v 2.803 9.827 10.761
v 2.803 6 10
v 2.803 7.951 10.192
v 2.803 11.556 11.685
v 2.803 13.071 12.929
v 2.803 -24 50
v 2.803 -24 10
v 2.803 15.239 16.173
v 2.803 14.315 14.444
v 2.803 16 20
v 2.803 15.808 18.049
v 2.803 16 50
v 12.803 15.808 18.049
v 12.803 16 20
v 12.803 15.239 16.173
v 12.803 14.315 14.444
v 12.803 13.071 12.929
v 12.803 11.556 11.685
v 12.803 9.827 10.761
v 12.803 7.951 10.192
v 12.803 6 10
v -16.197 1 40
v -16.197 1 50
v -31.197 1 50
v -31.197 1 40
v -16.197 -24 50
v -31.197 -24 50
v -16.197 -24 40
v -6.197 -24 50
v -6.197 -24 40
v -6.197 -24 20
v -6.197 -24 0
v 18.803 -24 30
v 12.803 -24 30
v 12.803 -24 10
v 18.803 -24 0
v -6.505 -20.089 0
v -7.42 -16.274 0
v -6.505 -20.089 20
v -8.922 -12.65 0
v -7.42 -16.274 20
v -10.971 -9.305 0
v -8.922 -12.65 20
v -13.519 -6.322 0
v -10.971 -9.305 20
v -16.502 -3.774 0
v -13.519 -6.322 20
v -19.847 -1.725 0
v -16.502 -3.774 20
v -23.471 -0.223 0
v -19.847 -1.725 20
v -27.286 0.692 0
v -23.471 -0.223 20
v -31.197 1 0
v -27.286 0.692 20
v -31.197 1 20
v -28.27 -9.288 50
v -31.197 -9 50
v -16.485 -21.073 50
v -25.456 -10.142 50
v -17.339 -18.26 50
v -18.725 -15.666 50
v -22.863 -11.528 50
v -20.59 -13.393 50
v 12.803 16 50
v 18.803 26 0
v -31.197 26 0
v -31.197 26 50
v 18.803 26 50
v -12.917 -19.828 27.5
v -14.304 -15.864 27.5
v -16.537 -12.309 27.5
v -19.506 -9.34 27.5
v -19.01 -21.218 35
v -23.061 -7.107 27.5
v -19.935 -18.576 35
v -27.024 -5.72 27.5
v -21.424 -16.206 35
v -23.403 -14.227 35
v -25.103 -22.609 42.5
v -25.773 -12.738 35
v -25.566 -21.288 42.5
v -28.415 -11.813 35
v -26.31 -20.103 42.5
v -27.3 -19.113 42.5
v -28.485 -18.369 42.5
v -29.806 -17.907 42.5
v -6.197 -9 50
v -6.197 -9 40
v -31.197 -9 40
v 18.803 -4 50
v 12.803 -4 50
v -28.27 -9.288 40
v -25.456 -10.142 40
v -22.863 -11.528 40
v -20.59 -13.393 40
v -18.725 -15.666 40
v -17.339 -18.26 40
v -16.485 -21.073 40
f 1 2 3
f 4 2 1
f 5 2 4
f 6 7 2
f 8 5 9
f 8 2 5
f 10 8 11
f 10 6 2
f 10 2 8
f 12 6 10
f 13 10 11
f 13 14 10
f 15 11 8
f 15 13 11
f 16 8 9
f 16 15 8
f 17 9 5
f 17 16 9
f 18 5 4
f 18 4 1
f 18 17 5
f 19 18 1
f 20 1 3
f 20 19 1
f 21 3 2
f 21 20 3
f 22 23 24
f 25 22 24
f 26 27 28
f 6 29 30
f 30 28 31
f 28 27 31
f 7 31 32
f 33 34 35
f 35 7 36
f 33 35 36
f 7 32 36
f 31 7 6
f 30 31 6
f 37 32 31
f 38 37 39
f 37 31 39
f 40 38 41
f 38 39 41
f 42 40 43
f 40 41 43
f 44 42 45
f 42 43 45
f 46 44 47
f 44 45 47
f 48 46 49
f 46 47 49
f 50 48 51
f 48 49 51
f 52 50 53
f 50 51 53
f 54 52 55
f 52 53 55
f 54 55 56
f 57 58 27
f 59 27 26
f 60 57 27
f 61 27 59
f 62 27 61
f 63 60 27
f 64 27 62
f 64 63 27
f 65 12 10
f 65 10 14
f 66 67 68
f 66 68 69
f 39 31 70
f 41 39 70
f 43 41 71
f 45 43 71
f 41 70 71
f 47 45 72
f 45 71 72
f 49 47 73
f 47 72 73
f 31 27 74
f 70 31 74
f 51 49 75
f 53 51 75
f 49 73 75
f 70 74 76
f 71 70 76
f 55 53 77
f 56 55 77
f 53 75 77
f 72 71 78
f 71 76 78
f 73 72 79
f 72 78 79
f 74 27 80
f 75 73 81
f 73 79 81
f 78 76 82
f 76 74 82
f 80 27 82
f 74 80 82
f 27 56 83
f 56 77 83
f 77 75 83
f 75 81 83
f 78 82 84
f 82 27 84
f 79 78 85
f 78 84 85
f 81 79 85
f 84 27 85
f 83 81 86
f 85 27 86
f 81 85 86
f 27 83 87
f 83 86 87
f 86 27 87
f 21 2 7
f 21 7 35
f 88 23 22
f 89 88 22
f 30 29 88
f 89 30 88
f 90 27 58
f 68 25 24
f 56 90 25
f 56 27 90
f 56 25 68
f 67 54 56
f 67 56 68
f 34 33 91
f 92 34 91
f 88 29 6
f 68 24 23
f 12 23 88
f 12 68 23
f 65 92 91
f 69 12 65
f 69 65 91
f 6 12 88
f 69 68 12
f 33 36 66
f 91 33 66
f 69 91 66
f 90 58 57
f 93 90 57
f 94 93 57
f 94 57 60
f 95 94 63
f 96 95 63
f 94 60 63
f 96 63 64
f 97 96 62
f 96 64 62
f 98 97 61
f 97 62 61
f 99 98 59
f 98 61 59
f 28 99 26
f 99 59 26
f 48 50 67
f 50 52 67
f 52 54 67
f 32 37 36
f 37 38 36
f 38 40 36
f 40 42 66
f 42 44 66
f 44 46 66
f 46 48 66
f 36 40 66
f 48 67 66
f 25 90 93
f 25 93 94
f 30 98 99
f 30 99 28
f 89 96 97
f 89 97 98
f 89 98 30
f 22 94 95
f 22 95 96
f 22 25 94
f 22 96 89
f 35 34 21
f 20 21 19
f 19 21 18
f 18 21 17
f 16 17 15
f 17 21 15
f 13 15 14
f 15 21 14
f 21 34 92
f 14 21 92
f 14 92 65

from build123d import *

# Parameters (mm, degrees)
F0_W      = 50
F0_H      = 50
F1_DEPTH  = 50
F4_DEPTH  = 10
F5_SIZE   = 10
F6_W      = 10
F6_H      = 40
F8_DEPTH  = 40
F9_R      = 10
F11_DEPTH = 6


with BuildPart() as f1:
    # F0 (on Top) → F1 (new body)
    with BuildSketch(Plane.XY):
        with Locations((-6.196748, 1.000199)):
            Rectangle(F0_W, F0_H)
    extrude(amount=F1_DEPTH)

    # F3 (on face) → F4 (cut)
    with BuildSketch(Plane.XY.offset(50)):
        with BuildLine():
            ThreePointArc((-31.196748, -8.999801), (-20.590146, -13.393199), (-16.196748, -23.999801))
            Line((-16.196748, -23.999801), (-6.196748, -23.999801))
            Line((-6.196748, -23.999801), (-6.196748, 1.000199))
            Line((-6.196748, 1.000199), (-31.196748, 1.000199))
            Line((-31.196748, 1.000199), (-31.196748, -8.999801))
        make_face()
    extrude(amount=-F4_DEPTH, mode=Mode.SUBTRACT)

    # F5
    f5_edges = [f1.edges().sort_by_distance(p)[0] for p in [
        (-6.196748, 1.000199, 45),
    ]]
    chamfer(f5_edges, length=F5_SIZE)

    # F6 (on face) → F8 (cut, through all)
    with BuildSketch(Plane.XY.offset(50)):
        with Locations((7.803252, -3.999801)):
            Rectangle(F6_W, F6_H)
    extrude(amount=-F8_DEPTH, mode=Mode.SUBTRACT)

    # F9
    f9_edges = [f1.edges().sort_by_distance(p)[0] for p in [
        (7.803252, 16.000199, 10),
    ]]
    fillet(f9_edges, radius=F9_R)

    # F10 (on face) → F11 (cut)
    with BuildSketch(Plane.YZ.offset(18.803252)):
        Polygon((-3.999801, 50), (-23.999801, 50), (-23.999801, 30), align=None)
    extrude(amount=-F11_DEPTH, mode=Mode.SUBTRACT)

    # F12 (on face) → F13 (revolve, cut)
    with BuildSketch(Plane.XZ.offset(23.999801)):
        Polygon((-6.196748, 20), (-31.196748, 50), (-31.196748, 0), (-6.196748, 0), align=None)
    revolve(axis=Axis((-31.196748, -23.999801, 25), (0, 0, 1)), mode=Mode.SUBTRACT)


solid = f1.part
